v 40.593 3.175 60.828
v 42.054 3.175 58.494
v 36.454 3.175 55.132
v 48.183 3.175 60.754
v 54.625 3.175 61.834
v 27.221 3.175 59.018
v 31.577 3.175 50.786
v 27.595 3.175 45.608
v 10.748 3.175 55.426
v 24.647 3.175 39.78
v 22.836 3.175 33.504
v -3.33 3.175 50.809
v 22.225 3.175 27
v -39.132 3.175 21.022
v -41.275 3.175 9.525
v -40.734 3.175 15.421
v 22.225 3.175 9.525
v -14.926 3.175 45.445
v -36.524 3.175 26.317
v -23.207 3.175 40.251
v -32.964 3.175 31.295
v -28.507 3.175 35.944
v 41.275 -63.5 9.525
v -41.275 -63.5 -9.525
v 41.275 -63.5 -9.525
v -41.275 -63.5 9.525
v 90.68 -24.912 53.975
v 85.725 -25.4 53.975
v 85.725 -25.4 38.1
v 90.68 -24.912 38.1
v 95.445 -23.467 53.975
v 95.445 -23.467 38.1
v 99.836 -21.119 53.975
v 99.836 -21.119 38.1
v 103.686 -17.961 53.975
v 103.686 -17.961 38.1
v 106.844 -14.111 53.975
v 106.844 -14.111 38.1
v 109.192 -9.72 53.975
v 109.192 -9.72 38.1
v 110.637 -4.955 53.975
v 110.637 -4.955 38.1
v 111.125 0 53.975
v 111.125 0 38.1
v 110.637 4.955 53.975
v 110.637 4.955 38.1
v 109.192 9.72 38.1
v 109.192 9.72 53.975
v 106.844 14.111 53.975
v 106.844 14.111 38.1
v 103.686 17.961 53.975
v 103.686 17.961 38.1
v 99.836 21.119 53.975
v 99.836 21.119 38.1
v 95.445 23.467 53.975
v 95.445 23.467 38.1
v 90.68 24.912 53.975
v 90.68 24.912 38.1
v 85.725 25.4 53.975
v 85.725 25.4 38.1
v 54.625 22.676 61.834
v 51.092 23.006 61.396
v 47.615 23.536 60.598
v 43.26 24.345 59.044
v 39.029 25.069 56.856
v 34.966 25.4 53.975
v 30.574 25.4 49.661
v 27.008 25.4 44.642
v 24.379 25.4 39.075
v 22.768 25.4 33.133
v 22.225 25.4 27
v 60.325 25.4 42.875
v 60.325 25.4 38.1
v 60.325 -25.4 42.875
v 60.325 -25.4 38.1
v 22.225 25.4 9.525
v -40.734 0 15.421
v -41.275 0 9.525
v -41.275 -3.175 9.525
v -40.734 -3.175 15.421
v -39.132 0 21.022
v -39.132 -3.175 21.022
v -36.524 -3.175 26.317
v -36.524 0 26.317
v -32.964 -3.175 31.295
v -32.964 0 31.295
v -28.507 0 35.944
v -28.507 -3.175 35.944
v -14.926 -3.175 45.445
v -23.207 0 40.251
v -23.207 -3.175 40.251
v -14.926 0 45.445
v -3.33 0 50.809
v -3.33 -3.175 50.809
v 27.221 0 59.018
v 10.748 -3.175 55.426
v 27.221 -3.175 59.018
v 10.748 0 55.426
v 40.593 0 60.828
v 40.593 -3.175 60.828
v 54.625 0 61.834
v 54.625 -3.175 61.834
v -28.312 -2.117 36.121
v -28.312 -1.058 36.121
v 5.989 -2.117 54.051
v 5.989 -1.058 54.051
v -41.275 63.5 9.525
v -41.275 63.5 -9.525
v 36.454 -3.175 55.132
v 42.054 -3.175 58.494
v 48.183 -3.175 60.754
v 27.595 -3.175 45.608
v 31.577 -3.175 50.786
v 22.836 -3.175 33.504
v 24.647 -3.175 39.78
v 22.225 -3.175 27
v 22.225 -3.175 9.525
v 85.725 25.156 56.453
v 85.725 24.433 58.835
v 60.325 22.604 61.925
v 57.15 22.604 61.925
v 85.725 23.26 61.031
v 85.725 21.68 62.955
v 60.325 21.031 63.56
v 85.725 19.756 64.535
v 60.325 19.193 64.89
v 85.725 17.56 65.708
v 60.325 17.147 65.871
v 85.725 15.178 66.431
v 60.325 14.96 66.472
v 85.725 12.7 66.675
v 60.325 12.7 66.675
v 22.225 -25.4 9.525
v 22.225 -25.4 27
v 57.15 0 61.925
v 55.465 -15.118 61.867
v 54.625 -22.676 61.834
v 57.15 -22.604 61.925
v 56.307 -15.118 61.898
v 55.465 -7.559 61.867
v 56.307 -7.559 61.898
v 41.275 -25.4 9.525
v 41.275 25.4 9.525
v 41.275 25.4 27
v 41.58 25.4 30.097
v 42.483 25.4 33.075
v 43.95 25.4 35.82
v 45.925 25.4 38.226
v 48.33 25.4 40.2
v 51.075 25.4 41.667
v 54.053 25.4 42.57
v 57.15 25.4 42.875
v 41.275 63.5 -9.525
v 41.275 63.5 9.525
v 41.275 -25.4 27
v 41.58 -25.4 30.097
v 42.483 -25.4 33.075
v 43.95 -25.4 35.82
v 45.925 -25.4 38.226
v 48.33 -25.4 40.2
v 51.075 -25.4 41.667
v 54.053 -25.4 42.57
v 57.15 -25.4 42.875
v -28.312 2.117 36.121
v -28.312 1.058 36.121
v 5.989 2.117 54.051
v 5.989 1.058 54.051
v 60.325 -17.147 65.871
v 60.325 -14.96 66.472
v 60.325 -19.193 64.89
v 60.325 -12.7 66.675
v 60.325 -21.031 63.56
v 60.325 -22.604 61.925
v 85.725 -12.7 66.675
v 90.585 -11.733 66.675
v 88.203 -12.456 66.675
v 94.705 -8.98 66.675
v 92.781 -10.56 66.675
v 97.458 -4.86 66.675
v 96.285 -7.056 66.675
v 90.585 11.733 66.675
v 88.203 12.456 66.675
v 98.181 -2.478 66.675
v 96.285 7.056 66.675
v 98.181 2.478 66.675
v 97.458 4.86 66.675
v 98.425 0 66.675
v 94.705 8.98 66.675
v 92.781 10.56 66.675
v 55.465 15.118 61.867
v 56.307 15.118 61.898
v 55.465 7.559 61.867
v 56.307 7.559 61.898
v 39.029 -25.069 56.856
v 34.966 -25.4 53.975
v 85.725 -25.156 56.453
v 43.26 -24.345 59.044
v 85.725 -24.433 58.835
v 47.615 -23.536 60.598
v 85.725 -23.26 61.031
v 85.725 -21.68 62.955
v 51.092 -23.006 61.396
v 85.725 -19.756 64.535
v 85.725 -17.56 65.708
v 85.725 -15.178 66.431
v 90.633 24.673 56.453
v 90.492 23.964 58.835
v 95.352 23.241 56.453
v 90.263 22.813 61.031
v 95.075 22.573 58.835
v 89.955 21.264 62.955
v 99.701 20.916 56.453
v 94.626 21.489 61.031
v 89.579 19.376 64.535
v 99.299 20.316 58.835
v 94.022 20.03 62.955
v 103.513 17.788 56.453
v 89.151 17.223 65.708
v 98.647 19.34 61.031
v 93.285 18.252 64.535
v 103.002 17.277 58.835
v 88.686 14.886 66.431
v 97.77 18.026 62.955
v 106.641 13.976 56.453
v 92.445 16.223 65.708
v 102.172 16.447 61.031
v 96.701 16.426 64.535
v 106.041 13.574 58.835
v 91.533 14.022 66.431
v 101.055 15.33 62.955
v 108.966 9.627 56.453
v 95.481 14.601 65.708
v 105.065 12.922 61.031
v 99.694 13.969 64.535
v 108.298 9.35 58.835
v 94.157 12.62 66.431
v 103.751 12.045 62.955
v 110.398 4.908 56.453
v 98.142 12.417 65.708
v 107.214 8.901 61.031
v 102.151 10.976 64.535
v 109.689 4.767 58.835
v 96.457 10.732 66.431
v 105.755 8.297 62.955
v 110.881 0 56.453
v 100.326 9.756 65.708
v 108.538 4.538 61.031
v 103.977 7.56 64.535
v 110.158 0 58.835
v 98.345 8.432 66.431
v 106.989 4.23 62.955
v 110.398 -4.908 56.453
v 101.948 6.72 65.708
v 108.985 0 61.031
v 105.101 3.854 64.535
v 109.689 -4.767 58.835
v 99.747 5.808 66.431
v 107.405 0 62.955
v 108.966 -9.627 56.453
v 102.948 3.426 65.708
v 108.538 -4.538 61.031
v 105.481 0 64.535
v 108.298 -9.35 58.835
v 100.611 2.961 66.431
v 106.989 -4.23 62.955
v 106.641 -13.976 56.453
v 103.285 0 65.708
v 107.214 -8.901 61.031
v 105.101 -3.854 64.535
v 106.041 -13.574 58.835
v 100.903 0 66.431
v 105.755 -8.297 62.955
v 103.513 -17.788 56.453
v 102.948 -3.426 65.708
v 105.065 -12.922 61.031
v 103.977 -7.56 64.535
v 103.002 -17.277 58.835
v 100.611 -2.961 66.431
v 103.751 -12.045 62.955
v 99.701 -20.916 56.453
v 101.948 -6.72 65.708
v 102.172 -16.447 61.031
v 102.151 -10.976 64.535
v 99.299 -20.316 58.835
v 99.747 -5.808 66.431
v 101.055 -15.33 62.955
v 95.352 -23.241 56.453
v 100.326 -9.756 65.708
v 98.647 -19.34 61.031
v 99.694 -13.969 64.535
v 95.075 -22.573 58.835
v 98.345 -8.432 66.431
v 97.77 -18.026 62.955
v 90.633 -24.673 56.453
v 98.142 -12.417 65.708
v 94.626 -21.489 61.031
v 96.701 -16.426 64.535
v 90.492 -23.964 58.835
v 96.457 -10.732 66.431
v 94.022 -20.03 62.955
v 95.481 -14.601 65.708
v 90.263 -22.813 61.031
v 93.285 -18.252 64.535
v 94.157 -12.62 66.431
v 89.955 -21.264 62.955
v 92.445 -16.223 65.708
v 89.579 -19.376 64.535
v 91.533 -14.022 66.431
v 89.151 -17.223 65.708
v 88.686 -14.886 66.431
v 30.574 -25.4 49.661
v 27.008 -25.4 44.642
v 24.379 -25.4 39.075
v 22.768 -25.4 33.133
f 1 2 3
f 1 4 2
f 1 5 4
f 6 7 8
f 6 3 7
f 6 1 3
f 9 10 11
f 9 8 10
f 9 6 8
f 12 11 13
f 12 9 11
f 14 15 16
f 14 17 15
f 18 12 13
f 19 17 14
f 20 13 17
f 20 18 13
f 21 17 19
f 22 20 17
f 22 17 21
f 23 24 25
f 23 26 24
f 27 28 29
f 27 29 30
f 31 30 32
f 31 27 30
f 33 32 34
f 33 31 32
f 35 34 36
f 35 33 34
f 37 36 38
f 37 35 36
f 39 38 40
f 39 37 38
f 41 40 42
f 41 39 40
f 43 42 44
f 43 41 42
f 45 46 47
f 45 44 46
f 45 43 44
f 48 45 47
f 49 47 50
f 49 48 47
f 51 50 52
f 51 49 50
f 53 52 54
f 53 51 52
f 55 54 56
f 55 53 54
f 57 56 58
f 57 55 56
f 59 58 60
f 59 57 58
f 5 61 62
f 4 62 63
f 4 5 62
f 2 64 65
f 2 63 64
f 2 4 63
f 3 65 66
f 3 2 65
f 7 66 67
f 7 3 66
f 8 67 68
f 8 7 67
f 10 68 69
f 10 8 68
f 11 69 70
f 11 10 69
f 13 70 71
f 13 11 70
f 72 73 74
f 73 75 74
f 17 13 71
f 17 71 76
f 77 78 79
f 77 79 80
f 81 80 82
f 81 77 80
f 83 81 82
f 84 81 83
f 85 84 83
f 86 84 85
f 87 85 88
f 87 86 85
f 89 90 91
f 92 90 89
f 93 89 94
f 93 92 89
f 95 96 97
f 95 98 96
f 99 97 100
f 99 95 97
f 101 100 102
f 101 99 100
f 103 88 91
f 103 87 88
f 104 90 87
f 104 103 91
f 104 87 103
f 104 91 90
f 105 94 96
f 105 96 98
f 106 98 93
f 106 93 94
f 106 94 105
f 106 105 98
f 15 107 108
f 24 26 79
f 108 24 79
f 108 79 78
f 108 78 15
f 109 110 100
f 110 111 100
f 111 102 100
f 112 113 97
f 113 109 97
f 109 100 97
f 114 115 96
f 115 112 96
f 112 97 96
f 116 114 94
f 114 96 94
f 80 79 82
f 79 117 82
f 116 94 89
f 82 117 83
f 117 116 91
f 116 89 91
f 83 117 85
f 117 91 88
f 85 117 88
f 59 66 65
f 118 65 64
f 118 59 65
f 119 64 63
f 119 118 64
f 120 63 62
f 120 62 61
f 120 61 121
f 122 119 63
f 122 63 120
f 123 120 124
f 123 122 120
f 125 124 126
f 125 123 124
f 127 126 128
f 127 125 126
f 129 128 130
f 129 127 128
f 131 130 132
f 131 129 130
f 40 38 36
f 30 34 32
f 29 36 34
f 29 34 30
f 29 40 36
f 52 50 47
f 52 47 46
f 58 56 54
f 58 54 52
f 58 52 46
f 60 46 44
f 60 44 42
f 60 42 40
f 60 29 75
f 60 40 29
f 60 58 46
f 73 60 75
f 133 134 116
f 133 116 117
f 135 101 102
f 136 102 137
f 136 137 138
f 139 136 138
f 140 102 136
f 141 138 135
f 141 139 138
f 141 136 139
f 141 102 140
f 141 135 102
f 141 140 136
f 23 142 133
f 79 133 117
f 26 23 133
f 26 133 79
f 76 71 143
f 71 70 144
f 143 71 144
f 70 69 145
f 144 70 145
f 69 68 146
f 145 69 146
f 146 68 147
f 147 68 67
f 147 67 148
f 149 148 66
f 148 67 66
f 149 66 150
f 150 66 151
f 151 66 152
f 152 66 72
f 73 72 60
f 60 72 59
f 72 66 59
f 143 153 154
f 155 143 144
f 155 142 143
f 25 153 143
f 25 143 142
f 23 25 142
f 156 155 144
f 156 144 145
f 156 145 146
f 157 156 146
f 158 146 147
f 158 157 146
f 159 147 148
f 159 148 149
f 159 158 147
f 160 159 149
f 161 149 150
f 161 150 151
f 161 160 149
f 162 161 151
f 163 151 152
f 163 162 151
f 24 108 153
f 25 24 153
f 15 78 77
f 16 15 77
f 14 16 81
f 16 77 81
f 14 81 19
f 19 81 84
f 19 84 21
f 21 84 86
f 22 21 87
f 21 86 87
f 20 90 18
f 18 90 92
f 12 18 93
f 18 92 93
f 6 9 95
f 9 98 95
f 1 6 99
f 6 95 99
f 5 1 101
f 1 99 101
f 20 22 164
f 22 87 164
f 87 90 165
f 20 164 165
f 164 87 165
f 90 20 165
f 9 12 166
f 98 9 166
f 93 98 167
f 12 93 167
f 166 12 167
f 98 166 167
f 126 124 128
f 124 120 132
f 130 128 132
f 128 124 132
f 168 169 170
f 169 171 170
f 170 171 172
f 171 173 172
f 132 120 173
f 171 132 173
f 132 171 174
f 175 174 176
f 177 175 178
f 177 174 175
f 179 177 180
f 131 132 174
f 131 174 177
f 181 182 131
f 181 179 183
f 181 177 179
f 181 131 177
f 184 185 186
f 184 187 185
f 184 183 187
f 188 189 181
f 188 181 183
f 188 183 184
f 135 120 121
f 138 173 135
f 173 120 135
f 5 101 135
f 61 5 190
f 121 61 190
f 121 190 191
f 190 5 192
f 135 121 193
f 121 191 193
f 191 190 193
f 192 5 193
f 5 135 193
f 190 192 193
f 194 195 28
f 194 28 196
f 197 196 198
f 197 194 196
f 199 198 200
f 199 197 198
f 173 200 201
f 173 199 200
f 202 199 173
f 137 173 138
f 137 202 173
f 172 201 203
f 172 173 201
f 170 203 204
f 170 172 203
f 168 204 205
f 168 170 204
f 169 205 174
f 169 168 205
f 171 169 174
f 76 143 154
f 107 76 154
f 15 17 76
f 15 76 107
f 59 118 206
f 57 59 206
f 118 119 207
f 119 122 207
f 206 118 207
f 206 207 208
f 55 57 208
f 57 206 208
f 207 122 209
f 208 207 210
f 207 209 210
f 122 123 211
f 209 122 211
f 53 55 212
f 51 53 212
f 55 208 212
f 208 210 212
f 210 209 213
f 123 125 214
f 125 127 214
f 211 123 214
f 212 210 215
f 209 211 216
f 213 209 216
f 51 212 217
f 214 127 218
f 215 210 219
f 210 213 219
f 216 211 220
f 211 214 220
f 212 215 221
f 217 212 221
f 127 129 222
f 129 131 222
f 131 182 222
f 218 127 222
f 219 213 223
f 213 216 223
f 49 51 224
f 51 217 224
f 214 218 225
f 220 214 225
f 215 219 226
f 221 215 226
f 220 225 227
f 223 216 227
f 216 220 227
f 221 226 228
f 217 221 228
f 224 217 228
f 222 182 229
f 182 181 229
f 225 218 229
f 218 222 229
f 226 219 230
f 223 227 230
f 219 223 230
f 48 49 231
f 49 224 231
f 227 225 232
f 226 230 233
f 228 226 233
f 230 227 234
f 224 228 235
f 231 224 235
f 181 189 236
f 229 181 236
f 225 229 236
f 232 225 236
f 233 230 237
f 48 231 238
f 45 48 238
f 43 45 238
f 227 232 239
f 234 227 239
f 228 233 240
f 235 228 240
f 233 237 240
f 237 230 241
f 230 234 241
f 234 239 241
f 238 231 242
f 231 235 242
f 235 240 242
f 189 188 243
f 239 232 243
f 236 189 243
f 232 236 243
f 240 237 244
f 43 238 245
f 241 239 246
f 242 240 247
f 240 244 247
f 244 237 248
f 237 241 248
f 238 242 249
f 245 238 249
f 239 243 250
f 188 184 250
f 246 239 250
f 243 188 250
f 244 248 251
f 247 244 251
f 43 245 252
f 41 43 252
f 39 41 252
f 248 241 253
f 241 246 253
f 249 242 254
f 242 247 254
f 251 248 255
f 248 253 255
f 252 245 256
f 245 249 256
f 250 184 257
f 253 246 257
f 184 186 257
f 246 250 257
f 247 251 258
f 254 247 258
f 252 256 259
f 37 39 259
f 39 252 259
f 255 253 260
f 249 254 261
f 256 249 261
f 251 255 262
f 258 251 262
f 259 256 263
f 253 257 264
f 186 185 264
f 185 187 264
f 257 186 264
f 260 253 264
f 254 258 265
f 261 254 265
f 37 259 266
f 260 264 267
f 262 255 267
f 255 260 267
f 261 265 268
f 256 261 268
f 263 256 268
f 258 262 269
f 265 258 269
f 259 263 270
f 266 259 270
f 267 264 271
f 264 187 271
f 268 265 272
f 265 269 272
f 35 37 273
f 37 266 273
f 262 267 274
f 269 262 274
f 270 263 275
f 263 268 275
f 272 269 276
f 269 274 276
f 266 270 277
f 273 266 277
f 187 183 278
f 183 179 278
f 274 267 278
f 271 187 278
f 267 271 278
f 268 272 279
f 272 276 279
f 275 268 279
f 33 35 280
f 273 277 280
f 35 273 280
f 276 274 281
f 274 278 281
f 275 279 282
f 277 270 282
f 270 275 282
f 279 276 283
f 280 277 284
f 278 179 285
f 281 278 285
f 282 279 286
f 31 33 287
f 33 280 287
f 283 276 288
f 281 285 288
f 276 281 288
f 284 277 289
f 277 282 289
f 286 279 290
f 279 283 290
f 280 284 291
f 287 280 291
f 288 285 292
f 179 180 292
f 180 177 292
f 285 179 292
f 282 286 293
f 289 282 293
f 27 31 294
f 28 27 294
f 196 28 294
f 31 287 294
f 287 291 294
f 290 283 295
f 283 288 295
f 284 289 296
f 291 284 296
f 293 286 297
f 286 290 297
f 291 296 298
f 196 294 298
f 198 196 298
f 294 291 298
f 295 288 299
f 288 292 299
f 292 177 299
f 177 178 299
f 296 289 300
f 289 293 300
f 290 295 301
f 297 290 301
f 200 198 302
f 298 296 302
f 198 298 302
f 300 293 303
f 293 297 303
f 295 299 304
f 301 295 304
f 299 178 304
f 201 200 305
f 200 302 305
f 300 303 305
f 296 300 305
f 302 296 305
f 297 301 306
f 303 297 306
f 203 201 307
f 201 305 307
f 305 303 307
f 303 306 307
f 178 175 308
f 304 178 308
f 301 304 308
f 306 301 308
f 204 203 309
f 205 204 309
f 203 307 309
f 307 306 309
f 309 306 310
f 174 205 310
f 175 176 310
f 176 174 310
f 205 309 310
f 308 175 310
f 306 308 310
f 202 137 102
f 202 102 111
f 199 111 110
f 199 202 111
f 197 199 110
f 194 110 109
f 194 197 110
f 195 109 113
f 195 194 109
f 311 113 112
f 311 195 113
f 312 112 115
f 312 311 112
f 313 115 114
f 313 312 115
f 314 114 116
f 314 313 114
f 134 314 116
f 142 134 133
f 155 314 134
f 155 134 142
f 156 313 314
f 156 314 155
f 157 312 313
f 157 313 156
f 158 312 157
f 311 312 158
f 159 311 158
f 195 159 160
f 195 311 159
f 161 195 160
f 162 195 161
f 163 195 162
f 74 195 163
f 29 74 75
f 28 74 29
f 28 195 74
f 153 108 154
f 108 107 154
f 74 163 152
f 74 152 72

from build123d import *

# Parameters (mm, degrees)
F1_DEPTH = 63.5
F0_W     = 25.4
F0_H     = 19.05
F0_H_2   = 4.7498
F0_H_3   = 4.7752
F2_DEPTH = 25.4
F4_DEPTH = 3.175
F5_R     = 12.7


with BuildPart() as f1:
    # F0 (on Front) → F1 (new body, symmetric)
    with BuildSketch(Plane.XZ):
        Polygon((-41.275, -9.525), (41.275, -9.525), (41.275, 9.525), (22.225, 9.525), (-41.275, 9.525), align=None)
    extrude(amount=F1_DEPTH, both=True)

    # F0 (on Front) → F2 (join, symmetric)
    with BuildSketch(Plane.XZ):
        with BuildLine():
            Line((22.225, 9.525), (41.275, 9.525))
            Line((41.275, 9.525), (41.275, 27.0002))
            ThreePointArc((41.275, 27.0002), (45.9246798487, 38.2255201513), (57.15, 42.8752))
            Line((57.15, 42.8752), (60.325, 42.8752))
            Line((60.325, 42.8752), (60.325, 61.9252))
            Line((60.325, 61.9252), (57.15, 61.9252))
            add(Edge.make_bspline(
                [(54.6251217416, 61.8338132892), (55.4640803854, 61.8685780106), (56.3057470428, 61.8990488271), (57.15, 61.9252)],
                knots=[109.7820212307, 109.7820212307, 109.7820212307, 109.7820212307, 111.5045361635, 111.5045361635, 111.5045361635, 111.5045361635], degree=3))
            ThreePointArc((54.6251217416, 61.8338132892), (31.5771921939, 50.7864802033), (22.225, 27.0002))
            Line((22.225, 27.0002), (22.225, 9.525))
        make_face()
        with Locations((73.025, 52.4002)):
            Rectangle(F0_W, F0_H)
        with Locations((73.025, 64.3001)):
            Rectangle(F0_W, F0_H_2)
        with Locations((73.025, 40.4876)):
            Rectangle(F0_W, F0_H_3)
    extrude(amount=F2_DEPTH, both=True)

    # F0 (on Front) → F3 (revolve)
    with BuildSketch(Plane.XZ):
        Polygon((85.725, 61.9252), (85.725, 42.8752), (85.725, 38.1), (111.125, 38.1), (111.125, 66.675), (85.725, 66.675), align=None)
    revolve(axis=Axis((85.725, 0, 52.3875), (0, 0, 1)))

    # F0 (on Front) → F4 (join, symmetric)
    with BuildSketch(Plane.XZ):
        with BuildLine():
            add(Edge.make_bspline(
                [(-41.275, 9.525), (-41.3146686629, 39.9607514864), (1.1552946366, 59.618133583), (54.6251217416, 61.8338132892)],
                knots=[0, 0, 0, 0, 109.7820212307, 109.7820212307, 109.7820212307, 109.7820212307], degree=3))
            Line((-41.275, 9.525), (22.225, 9.525))
            Line((22.225, 9.525), (22.225, 27.0002))
            ThreePointArc((22.225, 27.0002), (31.5771921939, 50.7864802033), (54.6251217416, 61.8338132892))
        make_face()
    extrude(amount=F4_DEPTH, both=True)

    # F5
    f5_edges = [f1.edges().sort_by_distance(p)[0] for p in [
        (85.725, 25.4, 52.3875),
        (73.025, 25.4, 66.675),
        (73.025, -25.4, 66.675),
        (111.125, 0, 66.675),
    ]]
    fillet(f5_edges, radius=F5_R)


solid = f1.part
